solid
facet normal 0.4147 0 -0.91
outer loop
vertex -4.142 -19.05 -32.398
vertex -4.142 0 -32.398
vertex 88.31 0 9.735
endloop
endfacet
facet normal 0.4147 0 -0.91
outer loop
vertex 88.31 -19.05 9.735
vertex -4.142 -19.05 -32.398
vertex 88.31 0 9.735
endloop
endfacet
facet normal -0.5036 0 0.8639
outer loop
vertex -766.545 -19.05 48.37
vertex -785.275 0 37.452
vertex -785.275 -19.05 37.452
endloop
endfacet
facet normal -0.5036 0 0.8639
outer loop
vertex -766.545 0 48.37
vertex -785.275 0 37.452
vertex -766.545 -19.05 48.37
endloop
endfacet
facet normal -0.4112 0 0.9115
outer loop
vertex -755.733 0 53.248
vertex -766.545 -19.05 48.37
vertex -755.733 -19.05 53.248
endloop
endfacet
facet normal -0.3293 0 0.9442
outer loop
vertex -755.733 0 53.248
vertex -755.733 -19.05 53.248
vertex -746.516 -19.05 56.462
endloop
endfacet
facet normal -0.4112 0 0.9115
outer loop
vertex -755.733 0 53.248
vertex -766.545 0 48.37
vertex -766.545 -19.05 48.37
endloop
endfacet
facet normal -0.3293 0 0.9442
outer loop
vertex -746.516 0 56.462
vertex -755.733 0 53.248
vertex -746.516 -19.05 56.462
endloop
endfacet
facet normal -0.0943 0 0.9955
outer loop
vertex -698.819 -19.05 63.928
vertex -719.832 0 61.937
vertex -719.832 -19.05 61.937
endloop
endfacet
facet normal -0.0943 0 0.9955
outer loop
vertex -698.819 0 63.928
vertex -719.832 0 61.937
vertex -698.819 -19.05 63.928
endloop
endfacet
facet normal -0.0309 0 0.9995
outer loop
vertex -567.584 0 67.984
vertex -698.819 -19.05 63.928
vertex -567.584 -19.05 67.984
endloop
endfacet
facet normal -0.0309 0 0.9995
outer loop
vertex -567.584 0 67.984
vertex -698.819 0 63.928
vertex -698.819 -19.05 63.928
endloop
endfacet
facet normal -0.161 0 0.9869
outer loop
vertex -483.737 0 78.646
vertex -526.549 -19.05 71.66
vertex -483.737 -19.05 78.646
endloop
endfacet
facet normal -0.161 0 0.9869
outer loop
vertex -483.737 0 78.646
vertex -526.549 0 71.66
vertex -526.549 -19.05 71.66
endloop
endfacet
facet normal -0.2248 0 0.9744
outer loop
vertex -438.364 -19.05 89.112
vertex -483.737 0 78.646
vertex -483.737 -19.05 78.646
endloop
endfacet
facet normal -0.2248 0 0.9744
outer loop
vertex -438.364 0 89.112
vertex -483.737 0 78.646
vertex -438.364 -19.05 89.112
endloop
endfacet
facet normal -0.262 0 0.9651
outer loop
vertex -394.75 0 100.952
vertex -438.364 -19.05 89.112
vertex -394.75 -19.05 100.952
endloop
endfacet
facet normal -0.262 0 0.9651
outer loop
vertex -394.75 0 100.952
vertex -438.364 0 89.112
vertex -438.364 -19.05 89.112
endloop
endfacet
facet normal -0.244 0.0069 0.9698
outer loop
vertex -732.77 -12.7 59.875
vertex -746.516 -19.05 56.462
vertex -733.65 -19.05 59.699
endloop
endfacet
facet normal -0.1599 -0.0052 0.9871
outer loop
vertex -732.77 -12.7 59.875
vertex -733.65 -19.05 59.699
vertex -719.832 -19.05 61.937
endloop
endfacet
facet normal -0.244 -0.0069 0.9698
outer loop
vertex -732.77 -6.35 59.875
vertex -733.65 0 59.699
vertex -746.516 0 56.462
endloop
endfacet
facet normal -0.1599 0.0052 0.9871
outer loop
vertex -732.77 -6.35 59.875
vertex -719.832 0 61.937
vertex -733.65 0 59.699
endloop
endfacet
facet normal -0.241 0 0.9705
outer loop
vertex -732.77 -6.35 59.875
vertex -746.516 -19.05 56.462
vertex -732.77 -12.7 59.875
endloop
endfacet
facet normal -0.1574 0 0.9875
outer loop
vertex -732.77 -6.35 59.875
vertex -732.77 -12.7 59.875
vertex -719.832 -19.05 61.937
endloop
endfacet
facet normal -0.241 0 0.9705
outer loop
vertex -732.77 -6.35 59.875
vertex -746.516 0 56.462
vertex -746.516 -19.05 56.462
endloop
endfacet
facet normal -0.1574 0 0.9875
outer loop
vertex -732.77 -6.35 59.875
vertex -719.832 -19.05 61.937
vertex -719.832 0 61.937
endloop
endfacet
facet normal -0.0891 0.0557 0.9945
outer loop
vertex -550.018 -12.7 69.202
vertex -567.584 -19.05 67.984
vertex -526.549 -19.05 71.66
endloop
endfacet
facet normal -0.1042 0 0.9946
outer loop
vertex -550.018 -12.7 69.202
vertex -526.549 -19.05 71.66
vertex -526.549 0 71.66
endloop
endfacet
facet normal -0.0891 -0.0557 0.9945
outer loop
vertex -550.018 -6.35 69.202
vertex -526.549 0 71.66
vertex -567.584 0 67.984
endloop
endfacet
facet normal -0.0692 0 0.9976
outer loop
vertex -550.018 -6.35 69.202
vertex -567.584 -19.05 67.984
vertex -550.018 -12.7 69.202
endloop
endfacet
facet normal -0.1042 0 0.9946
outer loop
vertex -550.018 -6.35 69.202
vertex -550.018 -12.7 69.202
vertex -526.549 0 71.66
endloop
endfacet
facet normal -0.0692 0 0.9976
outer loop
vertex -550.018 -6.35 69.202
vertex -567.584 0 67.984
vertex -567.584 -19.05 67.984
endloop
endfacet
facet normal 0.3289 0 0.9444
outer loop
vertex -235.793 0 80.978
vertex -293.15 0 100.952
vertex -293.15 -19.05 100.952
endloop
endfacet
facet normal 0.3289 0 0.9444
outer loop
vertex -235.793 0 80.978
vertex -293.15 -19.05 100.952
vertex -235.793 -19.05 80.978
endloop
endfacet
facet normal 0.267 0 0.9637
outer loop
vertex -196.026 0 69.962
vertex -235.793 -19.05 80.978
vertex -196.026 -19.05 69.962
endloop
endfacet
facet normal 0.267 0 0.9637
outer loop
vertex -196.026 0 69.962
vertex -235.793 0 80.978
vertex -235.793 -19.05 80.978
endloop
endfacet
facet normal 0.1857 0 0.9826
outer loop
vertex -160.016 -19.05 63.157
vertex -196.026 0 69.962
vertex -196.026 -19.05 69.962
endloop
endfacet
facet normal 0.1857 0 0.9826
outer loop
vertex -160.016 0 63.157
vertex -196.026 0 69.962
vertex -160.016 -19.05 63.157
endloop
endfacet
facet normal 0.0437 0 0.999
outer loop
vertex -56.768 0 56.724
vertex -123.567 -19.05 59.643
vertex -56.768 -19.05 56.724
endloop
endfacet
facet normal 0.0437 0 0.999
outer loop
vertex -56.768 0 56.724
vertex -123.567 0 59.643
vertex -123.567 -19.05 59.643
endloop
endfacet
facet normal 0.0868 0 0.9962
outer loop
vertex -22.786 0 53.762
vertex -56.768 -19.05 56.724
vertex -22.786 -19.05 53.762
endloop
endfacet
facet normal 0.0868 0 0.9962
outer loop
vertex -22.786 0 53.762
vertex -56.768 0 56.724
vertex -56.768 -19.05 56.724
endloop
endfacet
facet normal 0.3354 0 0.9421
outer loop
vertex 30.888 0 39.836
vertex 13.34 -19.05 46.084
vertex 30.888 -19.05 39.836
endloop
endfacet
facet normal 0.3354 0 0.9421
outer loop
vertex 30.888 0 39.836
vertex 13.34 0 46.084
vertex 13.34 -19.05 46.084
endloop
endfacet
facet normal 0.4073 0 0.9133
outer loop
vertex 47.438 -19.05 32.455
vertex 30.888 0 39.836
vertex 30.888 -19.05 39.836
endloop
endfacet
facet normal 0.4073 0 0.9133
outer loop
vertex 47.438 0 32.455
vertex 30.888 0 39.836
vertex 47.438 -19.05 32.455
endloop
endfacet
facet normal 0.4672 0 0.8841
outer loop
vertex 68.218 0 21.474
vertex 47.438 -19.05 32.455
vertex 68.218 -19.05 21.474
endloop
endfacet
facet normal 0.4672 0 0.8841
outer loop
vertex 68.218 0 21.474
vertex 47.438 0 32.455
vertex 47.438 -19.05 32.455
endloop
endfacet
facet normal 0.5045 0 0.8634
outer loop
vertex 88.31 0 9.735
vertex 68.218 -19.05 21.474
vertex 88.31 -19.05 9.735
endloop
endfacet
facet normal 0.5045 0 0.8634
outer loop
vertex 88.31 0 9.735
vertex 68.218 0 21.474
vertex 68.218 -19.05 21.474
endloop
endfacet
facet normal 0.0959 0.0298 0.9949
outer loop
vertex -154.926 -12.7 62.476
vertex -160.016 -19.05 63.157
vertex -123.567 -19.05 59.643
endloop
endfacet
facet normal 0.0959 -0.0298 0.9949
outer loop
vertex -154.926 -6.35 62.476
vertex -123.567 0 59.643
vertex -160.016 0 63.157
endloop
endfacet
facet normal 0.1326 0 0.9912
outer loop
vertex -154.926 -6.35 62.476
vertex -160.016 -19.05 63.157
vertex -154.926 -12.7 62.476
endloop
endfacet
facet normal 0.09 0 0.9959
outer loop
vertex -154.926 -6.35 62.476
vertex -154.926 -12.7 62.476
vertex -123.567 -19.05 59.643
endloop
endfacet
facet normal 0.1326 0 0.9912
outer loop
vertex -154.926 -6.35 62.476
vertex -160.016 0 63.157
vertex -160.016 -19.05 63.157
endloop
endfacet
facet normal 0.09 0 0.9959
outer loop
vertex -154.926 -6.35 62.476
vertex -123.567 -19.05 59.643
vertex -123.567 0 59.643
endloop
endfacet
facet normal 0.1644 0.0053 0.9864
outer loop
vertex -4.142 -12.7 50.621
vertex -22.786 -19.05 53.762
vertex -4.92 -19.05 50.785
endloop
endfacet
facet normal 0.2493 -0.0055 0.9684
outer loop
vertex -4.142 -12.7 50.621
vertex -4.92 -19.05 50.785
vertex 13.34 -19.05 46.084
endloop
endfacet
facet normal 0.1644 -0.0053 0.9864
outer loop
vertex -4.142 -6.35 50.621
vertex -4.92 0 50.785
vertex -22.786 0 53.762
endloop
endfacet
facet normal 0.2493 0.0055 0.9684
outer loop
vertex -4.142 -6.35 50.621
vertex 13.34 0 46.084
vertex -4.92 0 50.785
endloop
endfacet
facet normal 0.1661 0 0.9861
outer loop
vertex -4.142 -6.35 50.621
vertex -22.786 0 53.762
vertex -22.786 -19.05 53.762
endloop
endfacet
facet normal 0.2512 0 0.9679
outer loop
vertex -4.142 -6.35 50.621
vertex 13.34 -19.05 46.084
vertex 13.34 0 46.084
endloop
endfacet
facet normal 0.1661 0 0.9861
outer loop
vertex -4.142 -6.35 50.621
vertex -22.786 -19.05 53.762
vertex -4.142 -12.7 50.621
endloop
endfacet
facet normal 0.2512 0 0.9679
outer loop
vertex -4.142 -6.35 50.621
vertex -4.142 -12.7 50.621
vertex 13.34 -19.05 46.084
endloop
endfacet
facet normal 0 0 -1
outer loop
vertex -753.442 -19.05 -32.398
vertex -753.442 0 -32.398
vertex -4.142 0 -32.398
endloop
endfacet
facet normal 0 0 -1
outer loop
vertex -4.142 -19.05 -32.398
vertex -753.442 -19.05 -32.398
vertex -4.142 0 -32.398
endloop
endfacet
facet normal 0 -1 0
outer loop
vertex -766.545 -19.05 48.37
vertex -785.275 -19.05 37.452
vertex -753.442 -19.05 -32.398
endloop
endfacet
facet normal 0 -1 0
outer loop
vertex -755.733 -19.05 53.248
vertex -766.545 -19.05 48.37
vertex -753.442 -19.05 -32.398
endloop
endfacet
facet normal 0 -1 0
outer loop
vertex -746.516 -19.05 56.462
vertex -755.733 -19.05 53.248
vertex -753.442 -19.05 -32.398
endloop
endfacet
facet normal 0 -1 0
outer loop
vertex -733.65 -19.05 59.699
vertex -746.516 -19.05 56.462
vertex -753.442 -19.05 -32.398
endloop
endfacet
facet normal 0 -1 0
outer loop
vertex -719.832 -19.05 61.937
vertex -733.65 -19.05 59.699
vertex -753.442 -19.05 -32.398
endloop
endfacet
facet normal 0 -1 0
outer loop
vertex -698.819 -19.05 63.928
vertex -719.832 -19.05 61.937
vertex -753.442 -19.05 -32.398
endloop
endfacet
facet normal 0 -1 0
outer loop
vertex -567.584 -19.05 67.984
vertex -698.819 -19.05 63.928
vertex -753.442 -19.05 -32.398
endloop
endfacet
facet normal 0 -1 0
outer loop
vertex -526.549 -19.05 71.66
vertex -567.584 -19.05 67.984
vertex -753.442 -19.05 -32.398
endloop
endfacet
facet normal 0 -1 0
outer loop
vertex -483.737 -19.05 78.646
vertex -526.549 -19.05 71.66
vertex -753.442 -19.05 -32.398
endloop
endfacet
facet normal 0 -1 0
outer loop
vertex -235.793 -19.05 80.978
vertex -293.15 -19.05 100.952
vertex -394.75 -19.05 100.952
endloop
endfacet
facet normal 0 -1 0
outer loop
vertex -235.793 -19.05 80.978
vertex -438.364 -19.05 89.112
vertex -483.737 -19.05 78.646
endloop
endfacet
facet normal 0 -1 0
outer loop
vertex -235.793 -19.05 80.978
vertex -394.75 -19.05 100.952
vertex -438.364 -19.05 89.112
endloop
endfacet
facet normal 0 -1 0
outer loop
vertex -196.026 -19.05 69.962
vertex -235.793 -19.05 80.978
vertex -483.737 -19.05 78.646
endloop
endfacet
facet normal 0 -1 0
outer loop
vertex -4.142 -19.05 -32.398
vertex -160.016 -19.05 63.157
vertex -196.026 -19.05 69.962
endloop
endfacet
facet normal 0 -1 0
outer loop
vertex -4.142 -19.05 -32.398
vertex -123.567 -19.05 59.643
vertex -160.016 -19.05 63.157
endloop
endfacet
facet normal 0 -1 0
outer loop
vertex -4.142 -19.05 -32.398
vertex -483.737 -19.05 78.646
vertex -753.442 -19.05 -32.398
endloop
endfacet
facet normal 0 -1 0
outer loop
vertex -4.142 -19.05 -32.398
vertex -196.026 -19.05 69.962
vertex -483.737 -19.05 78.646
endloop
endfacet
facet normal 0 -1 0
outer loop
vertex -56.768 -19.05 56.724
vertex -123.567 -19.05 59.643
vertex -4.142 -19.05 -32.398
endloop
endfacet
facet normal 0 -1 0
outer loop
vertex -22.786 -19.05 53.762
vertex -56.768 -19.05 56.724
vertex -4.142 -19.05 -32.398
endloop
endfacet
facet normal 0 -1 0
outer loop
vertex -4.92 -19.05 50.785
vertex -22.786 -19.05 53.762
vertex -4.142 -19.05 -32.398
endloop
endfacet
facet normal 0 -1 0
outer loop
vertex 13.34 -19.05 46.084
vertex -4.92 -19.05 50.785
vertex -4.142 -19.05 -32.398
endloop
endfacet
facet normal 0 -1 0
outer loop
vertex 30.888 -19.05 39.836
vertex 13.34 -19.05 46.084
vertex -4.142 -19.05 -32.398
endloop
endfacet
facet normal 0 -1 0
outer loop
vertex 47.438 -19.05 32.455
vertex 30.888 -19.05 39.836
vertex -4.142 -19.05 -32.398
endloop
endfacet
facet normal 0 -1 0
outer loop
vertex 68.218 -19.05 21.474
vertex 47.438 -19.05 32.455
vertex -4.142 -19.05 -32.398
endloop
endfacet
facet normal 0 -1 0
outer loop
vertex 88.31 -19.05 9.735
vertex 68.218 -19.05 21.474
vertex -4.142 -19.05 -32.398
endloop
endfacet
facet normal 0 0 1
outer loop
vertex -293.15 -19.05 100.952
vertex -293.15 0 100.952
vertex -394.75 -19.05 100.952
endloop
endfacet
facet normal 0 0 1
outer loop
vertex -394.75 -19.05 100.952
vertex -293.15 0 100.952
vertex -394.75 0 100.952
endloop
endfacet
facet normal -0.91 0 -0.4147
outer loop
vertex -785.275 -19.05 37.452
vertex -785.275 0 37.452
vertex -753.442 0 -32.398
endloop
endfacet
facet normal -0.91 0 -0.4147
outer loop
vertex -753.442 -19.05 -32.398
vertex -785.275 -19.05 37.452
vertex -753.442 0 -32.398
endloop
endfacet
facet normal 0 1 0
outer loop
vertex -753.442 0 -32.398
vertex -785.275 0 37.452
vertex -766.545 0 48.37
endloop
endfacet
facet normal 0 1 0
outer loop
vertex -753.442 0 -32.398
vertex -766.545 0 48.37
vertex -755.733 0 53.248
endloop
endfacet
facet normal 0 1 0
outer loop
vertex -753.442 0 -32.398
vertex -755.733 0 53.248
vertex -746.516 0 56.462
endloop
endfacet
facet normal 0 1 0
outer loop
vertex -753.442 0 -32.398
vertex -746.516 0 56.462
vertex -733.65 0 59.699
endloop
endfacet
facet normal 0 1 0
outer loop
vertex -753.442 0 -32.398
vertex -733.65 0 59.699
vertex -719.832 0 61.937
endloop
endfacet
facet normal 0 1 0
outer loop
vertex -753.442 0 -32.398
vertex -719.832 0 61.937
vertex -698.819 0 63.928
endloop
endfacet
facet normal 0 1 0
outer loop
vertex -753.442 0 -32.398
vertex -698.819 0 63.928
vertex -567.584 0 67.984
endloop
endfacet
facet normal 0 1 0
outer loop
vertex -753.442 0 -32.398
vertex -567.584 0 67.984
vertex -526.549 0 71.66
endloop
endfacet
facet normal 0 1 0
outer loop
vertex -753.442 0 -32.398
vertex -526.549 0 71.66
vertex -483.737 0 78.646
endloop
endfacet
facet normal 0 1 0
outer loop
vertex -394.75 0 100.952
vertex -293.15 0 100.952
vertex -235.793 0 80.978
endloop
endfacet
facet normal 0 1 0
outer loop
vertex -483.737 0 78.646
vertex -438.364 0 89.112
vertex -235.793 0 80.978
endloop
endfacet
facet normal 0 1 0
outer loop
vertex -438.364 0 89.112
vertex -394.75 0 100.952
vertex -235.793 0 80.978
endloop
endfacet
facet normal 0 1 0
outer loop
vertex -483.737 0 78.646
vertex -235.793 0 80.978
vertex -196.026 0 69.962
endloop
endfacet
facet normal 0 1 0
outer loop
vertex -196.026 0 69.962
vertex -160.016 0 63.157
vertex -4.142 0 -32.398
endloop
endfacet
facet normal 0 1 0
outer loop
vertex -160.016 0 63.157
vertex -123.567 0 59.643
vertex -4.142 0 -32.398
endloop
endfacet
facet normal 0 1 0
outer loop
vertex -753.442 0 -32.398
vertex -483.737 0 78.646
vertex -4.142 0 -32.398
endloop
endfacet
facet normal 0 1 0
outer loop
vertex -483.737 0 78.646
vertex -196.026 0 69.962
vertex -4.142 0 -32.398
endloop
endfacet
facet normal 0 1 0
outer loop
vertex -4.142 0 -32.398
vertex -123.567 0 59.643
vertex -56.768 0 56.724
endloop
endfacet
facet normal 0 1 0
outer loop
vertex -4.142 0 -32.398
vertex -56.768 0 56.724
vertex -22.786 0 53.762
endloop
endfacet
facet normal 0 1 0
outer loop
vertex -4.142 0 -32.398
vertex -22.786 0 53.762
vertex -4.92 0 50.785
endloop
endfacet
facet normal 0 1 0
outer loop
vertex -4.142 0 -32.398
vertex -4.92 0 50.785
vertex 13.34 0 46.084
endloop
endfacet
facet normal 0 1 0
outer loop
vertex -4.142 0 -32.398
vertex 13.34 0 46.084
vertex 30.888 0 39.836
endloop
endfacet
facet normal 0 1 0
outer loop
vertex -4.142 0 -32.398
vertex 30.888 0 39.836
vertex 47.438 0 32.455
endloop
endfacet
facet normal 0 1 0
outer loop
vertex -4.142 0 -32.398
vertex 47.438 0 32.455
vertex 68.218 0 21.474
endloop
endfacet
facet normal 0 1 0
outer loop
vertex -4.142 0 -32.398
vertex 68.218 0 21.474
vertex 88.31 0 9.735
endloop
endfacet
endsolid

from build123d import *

# Parameters (mm, degrees)
F1_DEPTH = 19.05


with BuildPart() as f1:
    # F0 (on Front) → F1 (new body)
    with BuildSketch(Plane.XZ):
        with BuildLine():
            Line((-785.2747082114, 37.452469027), (-753.4422292625, -32.397530973))
            Line((-753.4422292625, -32.397530973), (-4.1422292625, -32.397530973))
            Line((-4.1422292625, -32.397530973), (88.3098358586, 9.7353024809))
            add(Edge.make_bspline(
                [(-293.1497082114, 100.952469027), (-249.3861376506, 84.8768374866), (-158.3679193405, 52.1954424277), (-2.6899127054, 63.192044415), (60.2584676484, 26.451100898), (88.3098358586, 9.7353024809)],
                knots=[0, 0, 0, 0, 0.3489063291, 0.7071352332, 1, 1, 1, 1], degree=3))
            Line((-293.1497082114, 100.952469027), (-394.7497082114, 100.952469027))
            add(Edge.make_bspline(
                [(-785.2747082114, 37.452469027), (-771.1525683757, 46.2814984453), (-731.7475471229, 70.9171482769), (-542.750116505, 59.7205416368), (-442.8870811461, 87.5417177428), (-394.7497082114, 100.952469027)],
                knots=[0, 0, 0, 0, 0.2243960672, 0.6261325762, 1, 1, 1, 1], degree=3))
        make_face()
    extrude(amount=F1_DEPTH)


solid = f1.part
